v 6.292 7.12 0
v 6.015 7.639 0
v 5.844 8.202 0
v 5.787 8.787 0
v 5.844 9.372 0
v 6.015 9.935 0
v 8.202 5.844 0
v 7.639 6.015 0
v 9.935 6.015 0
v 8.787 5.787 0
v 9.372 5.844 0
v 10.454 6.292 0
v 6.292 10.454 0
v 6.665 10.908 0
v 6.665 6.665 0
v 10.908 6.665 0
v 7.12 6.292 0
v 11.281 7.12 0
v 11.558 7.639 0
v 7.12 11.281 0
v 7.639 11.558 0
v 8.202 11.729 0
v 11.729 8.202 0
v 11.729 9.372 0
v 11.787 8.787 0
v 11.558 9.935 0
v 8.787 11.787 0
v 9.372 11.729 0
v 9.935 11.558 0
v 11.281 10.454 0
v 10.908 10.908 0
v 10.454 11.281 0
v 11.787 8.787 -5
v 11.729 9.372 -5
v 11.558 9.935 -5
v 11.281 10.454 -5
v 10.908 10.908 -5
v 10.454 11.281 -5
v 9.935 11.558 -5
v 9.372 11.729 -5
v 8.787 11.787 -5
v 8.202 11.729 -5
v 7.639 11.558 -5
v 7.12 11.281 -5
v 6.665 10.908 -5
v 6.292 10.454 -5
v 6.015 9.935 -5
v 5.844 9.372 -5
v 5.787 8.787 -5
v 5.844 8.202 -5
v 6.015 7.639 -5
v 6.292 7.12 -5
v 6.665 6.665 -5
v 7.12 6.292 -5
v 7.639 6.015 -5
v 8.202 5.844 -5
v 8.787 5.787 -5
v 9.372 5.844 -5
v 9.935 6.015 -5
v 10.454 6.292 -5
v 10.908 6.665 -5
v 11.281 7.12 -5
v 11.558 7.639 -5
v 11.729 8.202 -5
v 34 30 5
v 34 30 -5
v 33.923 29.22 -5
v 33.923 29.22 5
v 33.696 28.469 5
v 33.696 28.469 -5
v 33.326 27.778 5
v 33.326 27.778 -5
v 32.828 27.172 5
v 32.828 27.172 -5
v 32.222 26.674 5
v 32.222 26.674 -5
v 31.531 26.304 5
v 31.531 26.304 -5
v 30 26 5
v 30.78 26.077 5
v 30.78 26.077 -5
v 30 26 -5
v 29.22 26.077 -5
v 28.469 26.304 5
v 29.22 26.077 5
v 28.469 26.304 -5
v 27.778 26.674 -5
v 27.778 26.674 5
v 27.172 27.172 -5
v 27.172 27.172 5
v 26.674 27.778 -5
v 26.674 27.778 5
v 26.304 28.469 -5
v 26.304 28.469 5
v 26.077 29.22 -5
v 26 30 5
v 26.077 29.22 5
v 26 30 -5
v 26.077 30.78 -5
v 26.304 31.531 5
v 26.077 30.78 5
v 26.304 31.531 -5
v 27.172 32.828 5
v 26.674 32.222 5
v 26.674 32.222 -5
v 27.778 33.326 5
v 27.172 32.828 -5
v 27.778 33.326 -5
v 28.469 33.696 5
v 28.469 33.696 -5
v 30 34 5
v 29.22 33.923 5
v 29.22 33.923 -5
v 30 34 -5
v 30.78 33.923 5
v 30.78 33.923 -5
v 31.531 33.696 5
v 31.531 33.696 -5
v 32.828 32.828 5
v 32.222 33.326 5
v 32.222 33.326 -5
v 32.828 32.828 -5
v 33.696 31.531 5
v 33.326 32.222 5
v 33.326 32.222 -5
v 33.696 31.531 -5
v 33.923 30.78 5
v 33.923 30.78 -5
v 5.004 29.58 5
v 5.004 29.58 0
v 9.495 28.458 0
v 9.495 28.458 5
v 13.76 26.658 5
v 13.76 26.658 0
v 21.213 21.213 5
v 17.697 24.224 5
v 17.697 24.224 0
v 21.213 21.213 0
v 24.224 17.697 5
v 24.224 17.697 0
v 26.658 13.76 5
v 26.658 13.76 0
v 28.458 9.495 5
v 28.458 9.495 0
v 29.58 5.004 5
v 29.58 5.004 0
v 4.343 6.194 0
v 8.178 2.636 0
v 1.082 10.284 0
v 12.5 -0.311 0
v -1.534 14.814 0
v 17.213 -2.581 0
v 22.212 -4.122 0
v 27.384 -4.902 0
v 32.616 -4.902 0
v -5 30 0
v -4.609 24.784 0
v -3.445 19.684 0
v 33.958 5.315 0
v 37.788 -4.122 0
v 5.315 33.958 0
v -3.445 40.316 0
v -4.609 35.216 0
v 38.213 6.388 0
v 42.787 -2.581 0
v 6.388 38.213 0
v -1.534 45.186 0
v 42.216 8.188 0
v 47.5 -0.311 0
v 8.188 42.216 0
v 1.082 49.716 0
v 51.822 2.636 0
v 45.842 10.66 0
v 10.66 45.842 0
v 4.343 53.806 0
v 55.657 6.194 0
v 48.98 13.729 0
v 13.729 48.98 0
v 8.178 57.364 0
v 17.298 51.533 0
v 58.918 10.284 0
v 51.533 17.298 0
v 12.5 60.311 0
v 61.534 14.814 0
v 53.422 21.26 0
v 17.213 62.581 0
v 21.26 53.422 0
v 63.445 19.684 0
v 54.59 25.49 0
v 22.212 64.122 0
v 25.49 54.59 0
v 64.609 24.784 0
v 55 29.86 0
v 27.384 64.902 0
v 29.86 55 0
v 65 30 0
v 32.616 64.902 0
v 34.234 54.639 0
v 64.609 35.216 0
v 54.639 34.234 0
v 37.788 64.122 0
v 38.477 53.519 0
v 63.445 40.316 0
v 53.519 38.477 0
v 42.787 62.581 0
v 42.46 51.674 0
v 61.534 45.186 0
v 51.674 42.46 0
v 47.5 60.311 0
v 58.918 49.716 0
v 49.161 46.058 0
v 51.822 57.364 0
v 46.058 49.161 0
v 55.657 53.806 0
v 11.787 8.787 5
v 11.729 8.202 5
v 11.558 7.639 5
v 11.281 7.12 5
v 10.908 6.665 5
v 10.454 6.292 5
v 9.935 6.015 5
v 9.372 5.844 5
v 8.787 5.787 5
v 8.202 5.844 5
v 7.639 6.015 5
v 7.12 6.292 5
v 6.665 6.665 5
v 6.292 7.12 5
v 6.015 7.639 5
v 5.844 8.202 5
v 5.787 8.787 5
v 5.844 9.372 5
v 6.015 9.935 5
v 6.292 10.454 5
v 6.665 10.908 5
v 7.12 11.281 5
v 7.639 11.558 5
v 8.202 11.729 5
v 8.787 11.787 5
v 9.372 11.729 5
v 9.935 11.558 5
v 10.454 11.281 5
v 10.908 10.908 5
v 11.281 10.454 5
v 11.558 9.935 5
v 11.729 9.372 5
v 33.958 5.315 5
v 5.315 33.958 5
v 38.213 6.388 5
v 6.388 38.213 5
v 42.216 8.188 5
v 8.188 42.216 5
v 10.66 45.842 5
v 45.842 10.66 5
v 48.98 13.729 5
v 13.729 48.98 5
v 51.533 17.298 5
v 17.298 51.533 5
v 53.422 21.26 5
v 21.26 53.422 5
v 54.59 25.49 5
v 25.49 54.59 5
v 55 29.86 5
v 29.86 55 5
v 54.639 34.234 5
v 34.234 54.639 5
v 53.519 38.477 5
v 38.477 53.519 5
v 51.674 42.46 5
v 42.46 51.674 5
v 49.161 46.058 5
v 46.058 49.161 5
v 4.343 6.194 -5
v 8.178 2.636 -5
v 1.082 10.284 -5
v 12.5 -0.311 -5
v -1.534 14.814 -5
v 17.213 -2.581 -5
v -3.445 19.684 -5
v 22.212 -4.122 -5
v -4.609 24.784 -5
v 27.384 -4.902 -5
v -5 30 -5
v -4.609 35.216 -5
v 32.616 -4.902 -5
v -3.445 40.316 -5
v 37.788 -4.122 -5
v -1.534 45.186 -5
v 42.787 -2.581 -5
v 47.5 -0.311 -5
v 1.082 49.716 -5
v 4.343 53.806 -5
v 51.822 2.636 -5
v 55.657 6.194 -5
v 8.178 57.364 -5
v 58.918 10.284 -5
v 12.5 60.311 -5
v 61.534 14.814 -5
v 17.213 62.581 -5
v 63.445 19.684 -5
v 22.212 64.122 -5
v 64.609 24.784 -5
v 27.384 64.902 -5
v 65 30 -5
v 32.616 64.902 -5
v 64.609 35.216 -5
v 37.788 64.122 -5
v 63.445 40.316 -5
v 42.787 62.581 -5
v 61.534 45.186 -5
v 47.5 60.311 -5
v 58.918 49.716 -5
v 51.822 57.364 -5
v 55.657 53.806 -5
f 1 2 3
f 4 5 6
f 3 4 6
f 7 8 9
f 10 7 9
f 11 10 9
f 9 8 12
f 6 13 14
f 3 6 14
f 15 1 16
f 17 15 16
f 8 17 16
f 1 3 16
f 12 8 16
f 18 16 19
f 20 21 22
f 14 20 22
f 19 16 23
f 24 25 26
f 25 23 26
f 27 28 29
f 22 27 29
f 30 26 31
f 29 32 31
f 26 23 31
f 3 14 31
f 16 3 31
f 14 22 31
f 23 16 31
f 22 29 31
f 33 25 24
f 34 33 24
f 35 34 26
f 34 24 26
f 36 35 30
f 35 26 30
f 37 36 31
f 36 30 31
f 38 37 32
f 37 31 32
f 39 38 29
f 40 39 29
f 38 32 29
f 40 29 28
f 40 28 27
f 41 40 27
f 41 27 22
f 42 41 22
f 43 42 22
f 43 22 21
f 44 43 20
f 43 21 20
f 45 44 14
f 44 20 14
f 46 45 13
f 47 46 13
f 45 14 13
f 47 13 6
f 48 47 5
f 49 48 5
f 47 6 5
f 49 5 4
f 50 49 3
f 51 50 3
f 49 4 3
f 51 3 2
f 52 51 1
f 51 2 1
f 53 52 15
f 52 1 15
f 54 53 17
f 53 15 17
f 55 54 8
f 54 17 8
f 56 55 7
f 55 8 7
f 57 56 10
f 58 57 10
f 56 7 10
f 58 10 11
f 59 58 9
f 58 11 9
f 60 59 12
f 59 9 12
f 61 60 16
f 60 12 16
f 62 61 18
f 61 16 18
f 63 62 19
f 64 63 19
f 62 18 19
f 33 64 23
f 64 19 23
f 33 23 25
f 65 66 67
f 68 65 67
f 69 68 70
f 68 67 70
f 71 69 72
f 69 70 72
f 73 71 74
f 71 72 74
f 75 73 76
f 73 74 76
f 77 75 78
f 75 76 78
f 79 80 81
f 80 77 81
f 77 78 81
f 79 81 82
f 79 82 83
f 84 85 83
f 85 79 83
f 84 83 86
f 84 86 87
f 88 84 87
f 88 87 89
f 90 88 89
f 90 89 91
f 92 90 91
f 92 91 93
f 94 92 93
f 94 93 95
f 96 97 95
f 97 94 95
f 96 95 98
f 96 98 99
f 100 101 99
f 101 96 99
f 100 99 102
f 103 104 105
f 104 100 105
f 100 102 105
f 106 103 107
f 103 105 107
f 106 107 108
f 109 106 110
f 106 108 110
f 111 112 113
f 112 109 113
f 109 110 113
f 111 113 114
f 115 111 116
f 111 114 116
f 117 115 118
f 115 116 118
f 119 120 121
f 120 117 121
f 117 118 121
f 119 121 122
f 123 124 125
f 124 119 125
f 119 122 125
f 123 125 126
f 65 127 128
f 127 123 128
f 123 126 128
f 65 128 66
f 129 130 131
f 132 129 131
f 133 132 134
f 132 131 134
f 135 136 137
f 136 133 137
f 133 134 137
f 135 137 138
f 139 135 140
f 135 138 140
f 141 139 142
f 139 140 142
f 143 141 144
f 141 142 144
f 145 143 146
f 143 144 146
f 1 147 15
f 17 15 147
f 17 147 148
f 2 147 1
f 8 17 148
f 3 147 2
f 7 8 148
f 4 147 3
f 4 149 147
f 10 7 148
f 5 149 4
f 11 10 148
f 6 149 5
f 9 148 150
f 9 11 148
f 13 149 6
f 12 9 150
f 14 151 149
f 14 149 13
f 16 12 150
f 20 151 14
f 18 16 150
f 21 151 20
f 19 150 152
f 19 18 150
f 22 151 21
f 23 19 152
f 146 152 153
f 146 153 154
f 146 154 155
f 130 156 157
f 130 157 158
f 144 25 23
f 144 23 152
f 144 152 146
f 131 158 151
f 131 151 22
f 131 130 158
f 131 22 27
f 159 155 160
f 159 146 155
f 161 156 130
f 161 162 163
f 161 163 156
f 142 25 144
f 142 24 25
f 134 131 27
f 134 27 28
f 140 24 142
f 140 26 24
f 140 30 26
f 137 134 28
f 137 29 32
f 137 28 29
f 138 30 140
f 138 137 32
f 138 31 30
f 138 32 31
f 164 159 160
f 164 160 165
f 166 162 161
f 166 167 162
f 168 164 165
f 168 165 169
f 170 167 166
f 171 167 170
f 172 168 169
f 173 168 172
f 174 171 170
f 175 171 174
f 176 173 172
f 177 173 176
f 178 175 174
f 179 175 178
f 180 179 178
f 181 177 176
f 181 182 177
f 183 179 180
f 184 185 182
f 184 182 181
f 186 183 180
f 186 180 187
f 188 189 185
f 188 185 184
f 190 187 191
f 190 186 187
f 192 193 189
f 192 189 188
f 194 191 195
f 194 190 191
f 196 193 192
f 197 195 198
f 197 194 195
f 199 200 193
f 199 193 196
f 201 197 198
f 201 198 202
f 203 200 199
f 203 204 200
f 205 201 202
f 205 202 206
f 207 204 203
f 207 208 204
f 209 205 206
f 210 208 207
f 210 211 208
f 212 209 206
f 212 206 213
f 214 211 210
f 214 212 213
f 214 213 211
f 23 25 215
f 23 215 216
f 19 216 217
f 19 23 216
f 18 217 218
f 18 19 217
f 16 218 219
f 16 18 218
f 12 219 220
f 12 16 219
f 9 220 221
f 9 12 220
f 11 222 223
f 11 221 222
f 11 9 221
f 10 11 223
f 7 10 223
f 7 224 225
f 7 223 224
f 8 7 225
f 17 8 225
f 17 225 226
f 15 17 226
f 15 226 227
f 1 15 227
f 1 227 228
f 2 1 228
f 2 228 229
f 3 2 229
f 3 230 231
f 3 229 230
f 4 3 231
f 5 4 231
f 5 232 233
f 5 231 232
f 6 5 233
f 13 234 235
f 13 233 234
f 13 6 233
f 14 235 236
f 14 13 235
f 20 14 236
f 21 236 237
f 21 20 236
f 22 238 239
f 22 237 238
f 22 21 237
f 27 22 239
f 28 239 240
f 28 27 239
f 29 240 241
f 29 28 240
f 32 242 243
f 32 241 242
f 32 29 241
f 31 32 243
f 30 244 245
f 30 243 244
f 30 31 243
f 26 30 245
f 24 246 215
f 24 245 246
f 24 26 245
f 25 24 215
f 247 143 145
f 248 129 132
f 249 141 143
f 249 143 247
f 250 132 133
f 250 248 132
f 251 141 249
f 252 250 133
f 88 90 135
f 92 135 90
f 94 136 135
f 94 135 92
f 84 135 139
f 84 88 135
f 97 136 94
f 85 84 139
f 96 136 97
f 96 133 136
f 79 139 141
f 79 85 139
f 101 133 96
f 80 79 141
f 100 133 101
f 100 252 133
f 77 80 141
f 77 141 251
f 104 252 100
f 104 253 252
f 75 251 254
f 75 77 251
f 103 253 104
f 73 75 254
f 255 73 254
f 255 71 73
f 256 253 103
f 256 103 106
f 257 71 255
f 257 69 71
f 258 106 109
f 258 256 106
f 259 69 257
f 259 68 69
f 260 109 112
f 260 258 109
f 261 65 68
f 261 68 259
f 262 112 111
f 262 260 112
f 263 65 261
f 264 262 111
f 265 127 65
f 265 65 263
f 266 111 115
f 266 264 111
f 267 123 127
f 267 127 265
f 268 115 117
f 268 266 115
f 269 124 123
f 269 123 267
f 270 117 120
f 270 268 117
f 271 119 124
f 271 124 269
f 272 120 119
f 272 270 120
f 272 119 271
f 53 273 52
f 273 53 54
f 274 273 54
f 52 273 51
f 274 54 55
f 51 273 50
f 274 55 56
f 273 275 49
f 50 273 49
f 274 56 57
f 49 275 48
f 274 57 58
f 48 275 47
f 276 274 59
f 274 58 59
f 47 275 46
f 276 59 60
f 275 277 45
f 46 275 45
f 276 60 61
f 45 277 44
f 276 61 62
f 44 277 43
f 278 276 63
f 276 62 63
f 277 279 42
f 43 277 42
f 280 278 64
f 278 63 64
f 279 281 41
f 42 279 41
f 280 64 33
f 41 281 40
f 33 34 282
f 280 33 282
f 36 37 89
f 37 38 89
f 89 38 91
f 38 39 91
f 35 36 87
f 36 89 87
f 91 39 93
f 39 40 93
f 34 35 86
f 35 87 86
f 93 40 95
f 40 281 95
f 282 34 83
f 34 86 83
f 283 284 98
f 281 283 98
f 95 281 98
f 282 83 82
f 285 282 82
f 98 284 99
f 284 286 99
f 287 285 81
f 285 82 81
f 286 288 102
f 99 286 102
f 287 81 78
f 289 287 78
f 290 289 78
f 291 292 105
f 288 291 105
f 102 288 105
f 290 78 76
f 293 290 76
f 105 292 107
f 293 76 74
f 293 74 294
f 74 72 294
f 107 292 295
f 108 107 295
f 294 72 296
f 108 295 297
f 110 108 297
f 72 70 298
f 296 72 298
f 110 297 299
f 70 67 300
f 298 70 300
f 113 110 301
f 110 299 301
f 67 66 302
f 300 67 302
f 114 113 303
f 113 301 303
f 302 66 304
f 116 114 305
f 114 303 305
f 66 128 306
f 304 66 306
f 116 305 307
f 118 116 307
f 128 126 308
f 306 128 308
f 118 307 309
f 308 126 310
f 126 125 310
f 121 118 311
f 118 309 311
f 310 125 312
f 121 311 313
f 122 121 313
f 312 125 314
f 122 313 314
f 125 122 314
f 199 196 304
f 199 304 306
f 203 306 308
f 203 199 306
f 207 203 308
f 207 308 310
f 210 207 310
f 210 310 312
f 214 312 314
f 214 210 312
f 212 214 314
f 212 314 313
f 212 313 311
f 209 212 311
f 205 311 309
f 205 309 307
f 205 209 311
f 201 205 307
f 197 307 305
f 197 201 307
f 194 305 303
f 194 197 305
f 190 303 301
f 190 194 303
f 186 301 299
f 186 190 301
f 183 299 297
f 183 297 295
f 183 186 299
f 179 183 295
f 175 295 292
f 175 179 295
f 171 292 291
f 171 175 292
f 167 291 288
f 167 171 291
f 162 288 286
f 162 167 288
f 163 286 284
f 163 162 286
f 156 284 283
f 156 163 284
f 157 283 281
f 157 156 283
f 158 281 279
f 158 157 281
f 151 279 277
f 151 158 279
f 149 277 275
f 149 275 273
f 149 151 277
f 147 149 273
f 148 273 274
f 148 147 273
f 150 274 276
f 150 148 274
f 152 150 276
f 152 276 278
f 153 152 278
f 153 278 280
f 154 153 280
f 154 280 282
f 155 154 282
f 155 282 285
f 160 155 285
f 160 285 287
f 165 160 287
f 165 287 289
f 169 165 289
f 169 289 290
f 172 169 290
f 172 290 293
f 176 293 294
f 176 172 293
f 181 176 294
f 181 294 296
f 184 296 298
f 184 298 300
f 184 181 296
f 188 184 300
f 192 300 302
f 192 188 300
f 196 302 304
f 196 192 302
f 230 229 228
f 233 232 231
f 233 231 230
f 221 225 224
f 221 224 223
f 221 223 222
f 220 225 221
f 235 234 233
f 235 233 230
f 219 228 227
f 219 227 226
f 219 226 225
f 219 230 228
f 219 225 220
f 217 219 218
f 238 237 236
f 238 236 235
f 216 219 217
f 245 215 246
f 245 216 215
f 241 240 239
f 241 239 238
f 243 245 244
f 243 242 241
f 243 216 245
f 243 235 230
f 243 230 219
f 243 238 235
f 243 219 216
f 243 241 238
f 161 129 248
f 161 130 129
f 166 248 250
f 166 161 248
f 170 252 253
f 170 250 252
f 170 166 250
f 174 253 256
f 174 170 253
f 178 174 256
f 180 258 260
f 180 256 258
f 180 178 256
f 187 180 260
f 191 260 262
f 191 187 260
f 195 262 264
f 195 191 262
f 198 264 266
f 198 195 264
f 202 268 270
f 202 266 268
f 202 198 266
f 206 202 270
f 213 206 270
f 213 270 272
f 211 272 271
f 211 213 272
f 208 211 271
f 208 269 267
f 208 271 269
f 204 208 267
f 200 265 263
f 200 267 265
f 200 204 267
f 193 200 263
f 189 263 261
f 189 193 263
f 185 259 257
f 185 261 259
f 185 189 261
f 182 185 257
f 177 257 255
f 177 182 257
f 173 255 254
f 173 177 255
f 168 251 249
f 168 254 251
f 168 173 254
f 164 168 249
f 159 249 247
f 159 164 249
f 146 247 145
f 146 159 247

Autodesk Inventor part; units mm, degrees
ref_plane "YZ Plane" through (0, 0, 0) normal (1, 0, 0) x (0, 1, 0)
ref_plane "XZ Plane" through (0, 0, 0) normal (0, 1, 0) x (-1, 0, 0)
ref_plane "XY Plane" through (0, 0, 0) normal (0, 0, 1) x (1, 0, 0)
sketch "Sketch1" plane through (0, 0, 0) normal (0, 0, 1) x (1, 0, 0)
  line L0 (0, 0) -> (30, 0) construction
  line L1 (30, 0) -> (30, 30) construction
  line L2 (30, 30) -> (0, 30) construction
  line L3 (0, 30) -> (0, 0) construction
  circle A0 centre (0, 0) radius 30 construction
  circle A1 centre (30, 30) radius 30 construction
  circle A2 centre (30, 30) radius 35
  arc A3 (29.5798, 5.0035) -> (5.0035, 29.5798) centre (30, 30) ccw
  arc A4 (29.5798, 5.0035) -> (5.0035, 29.5798) centre (0, 0) ccw
  line L4 (30, 30) -> (0, 0) construction
  circle A5 centre (30, 30) radius 4
  circle A6 centre (8.7868, 8.7868) radius 3
  dimension "d3" = 60
  dimension "d0" = 30
  dimension "d1" = 30
  dimension "d2" = 60
  dimension "d4" = 70
  dimension "d5" = 50
  dimension "d6" = 8
  dimension "d7" = 6
extrude "Extrusion1" add sketch "Sketch1" along normal blind 5 contours A4 A3 | A6
extrude "Extrusion2" add sketch "Sketch1" against normal blind 5 contours A2 | A4 A3
properties part number "Geneva-driver"
